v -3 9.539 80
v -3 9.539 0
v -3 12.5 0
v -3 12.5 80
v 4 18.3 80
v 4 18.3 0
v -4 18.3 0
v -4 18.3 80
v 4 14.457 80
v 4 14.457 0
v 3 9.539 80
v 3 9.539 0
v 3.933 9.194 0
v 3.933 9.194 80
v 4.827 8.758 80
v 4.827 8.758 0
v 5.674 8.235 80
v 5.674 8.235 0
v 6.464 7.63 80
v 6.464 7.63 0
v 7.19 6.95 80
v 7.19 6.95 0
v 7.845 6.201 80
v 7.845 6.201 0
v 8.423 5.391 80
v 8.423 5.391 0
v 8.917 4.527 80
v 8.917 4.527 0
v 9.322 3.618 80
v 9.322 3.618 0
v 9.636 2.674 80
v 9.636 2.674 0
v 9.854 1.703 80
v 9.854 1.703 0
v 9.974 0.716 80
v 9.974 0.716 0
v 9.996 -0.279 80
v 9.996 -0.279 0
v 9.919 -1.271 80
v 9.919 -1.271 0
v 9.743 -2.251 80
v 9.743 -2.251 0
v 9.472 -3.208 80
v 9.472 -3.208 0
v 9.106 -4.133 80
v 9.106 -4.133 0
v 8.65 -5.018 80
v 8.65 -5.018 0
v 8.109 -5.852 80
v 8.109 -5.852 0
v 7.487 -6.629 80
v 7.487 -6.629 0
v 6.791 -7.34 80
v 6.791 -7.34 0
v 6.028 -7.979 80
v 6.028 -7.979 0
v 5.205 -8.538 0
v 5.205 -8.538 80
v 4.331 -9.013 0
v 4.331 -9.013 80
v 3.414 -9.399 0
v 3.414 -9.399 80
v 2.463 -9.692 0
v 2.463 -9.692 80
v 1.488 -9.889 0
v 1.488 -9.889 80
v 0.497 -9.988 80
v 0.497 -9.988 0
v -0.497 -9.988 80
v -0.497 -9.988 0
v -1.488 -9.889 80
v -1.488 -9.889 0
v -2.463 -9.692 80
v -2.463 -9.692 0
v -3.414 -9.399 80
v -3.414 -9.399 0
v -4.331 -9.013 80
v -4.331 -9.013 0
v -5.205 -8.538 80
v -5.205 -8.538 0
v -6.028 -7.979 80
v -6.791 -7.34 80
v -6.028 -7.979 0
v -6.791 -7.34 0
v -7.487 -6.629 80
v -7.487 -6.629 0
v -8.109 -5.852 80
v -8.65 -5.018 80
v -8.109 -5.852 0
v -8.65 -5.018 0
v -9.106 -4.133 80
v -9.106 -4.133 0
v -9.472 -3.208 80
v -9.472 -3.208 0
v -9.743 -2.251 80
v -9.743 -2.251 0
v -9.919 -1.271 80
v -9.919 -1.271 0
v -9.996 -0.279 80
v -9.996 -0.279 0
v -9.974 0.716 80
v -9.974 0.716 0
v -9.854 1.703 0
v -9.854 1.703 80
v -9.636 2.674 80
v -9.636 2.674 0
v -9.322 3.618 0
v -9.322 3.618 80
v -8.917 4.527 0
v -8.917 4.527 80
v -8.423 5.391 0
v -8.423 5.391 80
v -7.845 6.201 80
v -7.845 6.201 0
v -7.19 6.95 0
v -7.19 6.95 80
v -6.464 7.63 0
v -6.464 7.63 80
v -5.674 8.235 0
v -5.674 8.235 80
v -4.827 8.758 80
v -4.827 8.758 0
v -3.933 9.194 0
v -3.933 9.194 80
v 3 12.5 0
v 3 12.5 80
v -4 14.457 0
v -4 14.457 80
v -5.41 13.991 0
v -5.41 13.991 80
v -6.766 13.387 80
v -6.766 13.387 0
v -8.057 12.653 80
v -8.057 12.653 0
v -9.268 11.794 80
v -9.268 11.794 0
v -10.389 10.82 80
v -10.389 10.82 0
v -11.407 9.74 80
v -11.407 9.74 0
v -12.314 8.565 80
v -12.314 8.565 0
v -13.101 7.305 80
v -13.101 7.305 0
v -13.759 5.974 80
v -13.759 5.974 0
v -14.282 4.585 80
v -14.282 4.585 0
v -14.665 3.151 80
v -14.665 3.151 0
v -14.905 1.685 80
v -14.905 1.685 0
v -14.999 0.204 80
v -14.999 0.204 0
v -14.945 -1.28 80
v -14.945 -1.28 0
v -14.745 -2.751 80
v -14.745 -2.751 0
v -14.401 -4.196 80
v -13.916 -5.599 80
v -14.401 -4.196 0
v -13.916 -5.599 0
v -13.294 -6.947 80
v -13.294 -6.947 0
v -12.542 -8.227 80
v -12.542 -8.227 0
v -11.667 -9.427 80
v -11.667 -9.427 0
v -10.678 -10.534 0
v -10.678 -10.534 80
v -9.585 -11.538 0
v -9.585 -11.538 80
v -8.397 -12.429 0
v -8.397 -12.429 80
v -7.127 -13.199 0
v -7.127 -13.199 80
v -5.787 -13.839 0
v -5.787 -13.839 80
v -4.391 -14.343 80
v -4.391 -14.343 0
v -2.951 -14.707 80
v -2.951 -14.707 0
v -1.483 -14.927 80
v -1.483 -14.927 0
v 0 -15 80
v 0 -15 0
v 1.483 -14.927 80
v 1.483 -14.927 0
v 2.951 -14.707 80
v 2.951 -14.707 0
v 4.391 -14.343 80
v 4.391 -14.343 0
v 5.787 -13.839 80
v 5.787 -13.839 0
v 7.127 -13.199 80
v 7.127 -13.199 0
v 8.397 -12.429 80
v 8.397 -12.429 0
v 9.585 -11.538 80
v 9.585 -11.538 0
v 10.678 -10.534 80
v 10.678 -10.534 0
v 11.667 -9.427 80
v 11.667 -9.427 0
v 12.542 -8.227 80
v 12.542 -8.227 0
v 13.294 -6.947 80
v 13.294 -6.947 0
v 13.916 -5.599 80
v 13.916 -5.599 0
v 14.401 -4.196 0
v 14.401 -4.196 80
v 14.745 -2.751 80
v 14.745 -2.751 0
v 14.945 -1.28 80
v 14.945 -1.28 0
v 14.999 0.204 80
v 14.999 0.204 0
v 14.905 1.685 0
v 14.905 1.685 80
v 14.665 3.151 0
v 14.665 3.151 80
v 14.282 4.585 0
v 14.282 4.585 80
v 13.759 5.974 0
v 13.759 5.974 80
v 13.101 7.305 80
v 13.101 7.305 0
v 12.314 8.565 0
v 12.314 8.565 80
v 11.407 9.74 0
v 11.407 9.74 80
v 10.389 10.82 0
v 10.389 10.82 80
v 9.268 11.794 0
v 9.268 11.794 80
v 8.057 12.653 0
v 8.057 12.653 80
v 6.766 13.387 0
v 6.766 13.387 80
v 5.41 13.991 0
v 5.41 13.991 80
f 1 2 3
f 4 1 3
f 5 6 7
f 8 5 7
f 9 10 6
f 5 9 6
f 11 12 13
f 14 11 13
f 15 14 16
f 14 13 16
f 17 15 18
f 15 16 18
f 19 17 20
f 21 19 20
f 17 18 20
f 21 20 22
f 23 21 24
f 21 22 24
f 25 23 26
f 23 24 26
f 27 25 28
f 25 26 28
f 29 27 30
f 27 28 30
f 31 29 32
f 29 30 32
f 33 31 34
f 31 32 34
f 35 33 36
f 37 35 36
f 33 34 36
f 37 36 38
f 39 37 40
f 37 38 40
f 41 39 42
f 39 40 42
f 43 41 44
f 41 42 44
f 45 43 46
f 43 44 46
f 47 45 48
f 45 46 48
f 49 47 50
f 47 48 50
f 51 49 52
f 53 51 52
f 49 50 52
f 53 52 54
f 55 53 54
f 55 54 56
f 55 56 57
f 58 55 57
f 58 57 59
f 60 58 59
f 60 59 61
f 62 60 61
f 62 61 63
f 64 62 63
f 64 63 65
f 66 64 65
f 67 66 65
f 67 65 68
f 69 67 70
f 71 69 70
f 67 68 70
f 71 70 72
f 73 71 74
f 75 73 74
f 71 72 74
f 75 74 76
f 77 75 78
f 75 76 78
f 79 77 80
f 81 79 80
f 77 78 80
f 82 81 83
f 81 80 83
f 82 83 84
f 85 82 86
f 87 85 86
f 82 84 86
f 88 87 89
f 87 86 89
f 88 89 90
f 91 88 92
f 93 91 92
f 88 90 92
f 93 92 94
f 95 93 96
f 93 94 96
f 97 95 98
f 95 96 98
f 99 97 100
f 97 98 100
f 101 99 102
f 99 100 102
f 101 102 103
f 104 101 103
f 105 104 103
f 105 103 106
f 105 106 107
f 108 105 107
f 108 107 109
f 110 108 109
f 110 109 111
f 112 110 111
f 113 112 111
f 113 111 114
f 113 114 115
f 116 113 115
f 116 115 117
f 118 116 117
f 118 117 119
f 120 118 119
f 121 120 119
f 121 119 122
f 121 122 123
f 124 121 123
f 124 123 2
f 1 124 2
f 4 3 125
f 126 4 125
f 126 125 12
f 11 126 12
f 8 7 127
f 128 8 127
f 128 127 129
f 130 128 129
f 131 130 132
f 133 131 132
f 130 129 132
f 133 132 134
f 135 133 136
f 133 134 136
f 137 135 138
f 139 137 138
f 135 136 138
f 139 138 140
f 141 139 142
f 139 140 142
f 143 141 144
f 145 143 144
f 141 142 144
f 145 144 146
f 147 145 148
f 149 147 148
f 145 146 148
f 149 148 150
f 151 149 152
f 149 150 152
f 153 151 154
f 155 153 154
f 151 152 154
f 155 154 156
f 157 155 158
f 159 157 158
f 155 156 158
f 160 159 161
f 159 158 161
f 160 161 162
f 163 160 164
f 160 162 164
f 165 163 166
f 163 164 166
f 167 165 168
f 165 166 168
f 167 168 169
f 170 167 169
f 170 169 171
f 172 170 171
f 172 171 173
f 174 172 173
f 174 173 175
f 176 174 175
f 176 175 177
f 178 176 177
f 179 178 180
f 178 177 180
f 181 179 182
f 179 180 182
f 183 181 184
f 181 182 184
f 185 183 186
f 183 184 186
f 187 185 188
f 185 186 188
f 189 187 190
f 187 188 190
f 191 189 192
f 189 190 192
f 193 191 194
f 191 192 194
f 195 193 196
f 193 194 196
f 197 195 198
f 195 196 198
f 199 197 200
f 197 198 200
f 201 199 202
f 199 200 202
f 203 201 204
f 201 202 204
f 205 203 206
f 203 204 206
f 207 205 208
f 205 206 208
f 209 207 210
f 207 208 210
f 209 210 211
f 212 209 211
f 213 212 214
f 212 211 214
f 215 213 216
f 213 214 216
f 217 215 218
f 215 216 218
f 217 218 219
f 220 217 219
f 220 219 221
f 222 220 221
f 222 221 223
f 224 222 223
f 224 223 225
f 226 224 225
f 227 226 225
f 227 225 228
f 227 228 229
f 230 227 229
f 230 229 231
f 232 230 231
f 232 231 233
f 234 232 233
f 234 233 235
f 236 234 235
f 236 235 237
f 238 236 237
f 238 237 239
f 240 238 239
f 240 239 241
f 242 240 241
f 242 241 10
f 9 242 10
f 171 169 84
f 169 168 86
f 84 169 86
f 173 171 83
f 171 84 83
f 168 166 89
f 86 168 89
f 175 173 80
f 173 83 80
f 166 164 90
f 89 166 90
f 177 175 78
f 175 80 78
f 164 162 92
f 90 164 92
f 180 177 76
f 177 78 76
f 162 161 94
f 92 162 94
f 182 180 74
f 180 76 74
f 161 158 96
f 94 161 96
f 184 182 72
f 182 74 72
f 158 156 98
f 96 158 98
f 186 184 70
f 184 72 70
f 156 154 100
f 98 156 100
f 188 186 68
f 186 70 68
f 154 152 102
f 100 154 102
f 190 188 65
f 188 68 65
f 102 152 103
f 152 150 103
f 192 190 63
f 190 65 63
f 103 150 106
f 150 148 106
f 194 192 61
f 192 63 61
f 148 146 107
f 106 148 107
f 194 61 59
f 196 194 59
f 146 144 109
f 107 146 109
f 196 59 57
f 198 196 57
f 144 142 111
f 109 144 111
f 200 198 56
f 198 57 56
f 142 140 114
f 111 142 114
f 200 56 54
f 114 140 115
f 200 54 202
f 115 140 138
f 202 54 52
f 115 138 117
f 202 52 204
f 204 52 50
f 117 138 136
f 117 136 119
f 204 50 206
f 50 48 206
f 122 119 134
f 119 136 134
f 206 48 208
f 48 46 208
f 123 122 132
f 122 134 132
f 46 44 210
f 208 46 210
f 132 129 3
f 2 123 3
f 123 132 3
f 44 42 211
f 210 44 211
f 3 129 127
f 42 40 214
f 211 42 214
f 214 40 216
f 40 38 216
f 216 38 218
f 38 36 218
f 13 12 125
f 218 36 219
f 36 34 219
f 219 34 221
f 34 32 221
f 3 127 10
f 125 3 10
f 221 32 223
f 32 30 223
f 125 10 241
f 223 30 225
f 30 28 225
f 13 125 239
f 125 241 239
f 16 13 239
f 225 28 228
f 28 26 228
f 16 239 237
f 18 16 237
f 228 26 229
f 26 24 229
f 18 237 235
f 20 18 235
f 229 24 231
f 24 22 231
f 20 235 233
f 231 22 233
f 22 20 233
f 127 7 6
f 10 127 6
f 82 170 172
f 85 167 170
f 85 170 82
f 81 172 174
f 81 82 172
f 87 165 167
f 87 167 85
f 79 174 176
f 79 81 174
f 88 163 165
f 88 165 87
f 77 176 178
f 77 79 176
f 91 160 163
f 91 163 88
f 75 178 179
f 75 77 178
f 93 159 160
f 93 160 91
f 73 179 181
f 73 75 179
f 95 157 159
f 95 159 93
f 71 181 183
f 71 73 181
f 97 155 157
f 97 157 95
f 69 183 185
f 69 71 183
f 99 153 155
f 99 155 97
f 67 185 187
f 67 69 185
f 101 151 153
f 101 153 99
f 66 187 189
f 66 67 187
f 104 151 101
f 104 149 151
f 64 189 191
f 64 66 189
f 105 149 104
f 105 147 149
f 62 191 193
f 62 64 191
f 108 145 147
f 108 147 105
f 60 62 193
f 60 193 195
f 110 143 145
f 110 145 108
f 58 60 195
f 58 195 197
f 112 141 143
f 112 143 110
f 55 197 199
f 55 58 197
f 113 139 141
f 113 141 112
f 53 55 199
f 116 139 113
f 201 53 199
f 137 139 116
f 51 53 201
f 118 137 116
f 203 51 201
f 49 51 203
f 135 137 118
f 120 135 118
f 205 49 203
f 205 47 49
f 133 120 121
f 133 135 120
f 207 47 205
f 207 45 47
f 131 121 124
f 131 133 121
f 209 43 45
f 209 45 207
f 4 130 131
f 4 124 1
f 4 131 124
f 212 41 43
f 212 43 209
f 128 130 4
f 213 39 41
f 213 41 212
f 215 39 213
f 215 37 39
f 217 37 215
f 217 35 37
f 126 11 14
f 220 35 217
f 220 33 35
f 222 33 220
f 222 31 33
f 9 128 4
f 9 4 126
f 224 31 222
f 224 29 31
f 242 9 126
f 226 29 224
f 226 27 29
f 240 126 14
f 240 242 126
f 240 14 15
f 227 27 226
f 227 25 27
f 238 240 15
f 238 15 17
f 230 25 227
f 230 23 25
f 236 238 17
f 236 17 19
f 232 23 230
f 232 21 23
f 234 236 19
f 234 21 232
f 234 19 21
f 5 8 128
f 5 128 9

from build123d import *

# Parameters (mm, degrees)
EXTRUDE_1_DEPTH = 80


with BuildPart() as part:
    # 草图1 → 凸台-拉伸1 (new body)
    with BuildSketch(Plane.XY):
        with BuildLine():
            Line((-4, 18.3), (-4, 14.456832295))
            ThreePointArc((-4, 14.456832295), (0, -15), (4, 14.456832295))
            Line((4, 14.456832295), (4, 18.3))
            Line((4, 18.3), (-4, 18.3))
        make_face()
        with BuildLine():
            Line((-3, 9.539392014), (-3, 12.5))
            Line((-3, 12.5), (3, 12.5))
            Line((3, 12.5), (3, 9.539392014))
            ThreePointArc((3, 9.539392014), (0, -10), (-3, 9.539392014))
        make_face(mode=Mode.SUBTRACT)
    extrude(amount=EXTRUDE_1_DEPTH)


solid = part.part
